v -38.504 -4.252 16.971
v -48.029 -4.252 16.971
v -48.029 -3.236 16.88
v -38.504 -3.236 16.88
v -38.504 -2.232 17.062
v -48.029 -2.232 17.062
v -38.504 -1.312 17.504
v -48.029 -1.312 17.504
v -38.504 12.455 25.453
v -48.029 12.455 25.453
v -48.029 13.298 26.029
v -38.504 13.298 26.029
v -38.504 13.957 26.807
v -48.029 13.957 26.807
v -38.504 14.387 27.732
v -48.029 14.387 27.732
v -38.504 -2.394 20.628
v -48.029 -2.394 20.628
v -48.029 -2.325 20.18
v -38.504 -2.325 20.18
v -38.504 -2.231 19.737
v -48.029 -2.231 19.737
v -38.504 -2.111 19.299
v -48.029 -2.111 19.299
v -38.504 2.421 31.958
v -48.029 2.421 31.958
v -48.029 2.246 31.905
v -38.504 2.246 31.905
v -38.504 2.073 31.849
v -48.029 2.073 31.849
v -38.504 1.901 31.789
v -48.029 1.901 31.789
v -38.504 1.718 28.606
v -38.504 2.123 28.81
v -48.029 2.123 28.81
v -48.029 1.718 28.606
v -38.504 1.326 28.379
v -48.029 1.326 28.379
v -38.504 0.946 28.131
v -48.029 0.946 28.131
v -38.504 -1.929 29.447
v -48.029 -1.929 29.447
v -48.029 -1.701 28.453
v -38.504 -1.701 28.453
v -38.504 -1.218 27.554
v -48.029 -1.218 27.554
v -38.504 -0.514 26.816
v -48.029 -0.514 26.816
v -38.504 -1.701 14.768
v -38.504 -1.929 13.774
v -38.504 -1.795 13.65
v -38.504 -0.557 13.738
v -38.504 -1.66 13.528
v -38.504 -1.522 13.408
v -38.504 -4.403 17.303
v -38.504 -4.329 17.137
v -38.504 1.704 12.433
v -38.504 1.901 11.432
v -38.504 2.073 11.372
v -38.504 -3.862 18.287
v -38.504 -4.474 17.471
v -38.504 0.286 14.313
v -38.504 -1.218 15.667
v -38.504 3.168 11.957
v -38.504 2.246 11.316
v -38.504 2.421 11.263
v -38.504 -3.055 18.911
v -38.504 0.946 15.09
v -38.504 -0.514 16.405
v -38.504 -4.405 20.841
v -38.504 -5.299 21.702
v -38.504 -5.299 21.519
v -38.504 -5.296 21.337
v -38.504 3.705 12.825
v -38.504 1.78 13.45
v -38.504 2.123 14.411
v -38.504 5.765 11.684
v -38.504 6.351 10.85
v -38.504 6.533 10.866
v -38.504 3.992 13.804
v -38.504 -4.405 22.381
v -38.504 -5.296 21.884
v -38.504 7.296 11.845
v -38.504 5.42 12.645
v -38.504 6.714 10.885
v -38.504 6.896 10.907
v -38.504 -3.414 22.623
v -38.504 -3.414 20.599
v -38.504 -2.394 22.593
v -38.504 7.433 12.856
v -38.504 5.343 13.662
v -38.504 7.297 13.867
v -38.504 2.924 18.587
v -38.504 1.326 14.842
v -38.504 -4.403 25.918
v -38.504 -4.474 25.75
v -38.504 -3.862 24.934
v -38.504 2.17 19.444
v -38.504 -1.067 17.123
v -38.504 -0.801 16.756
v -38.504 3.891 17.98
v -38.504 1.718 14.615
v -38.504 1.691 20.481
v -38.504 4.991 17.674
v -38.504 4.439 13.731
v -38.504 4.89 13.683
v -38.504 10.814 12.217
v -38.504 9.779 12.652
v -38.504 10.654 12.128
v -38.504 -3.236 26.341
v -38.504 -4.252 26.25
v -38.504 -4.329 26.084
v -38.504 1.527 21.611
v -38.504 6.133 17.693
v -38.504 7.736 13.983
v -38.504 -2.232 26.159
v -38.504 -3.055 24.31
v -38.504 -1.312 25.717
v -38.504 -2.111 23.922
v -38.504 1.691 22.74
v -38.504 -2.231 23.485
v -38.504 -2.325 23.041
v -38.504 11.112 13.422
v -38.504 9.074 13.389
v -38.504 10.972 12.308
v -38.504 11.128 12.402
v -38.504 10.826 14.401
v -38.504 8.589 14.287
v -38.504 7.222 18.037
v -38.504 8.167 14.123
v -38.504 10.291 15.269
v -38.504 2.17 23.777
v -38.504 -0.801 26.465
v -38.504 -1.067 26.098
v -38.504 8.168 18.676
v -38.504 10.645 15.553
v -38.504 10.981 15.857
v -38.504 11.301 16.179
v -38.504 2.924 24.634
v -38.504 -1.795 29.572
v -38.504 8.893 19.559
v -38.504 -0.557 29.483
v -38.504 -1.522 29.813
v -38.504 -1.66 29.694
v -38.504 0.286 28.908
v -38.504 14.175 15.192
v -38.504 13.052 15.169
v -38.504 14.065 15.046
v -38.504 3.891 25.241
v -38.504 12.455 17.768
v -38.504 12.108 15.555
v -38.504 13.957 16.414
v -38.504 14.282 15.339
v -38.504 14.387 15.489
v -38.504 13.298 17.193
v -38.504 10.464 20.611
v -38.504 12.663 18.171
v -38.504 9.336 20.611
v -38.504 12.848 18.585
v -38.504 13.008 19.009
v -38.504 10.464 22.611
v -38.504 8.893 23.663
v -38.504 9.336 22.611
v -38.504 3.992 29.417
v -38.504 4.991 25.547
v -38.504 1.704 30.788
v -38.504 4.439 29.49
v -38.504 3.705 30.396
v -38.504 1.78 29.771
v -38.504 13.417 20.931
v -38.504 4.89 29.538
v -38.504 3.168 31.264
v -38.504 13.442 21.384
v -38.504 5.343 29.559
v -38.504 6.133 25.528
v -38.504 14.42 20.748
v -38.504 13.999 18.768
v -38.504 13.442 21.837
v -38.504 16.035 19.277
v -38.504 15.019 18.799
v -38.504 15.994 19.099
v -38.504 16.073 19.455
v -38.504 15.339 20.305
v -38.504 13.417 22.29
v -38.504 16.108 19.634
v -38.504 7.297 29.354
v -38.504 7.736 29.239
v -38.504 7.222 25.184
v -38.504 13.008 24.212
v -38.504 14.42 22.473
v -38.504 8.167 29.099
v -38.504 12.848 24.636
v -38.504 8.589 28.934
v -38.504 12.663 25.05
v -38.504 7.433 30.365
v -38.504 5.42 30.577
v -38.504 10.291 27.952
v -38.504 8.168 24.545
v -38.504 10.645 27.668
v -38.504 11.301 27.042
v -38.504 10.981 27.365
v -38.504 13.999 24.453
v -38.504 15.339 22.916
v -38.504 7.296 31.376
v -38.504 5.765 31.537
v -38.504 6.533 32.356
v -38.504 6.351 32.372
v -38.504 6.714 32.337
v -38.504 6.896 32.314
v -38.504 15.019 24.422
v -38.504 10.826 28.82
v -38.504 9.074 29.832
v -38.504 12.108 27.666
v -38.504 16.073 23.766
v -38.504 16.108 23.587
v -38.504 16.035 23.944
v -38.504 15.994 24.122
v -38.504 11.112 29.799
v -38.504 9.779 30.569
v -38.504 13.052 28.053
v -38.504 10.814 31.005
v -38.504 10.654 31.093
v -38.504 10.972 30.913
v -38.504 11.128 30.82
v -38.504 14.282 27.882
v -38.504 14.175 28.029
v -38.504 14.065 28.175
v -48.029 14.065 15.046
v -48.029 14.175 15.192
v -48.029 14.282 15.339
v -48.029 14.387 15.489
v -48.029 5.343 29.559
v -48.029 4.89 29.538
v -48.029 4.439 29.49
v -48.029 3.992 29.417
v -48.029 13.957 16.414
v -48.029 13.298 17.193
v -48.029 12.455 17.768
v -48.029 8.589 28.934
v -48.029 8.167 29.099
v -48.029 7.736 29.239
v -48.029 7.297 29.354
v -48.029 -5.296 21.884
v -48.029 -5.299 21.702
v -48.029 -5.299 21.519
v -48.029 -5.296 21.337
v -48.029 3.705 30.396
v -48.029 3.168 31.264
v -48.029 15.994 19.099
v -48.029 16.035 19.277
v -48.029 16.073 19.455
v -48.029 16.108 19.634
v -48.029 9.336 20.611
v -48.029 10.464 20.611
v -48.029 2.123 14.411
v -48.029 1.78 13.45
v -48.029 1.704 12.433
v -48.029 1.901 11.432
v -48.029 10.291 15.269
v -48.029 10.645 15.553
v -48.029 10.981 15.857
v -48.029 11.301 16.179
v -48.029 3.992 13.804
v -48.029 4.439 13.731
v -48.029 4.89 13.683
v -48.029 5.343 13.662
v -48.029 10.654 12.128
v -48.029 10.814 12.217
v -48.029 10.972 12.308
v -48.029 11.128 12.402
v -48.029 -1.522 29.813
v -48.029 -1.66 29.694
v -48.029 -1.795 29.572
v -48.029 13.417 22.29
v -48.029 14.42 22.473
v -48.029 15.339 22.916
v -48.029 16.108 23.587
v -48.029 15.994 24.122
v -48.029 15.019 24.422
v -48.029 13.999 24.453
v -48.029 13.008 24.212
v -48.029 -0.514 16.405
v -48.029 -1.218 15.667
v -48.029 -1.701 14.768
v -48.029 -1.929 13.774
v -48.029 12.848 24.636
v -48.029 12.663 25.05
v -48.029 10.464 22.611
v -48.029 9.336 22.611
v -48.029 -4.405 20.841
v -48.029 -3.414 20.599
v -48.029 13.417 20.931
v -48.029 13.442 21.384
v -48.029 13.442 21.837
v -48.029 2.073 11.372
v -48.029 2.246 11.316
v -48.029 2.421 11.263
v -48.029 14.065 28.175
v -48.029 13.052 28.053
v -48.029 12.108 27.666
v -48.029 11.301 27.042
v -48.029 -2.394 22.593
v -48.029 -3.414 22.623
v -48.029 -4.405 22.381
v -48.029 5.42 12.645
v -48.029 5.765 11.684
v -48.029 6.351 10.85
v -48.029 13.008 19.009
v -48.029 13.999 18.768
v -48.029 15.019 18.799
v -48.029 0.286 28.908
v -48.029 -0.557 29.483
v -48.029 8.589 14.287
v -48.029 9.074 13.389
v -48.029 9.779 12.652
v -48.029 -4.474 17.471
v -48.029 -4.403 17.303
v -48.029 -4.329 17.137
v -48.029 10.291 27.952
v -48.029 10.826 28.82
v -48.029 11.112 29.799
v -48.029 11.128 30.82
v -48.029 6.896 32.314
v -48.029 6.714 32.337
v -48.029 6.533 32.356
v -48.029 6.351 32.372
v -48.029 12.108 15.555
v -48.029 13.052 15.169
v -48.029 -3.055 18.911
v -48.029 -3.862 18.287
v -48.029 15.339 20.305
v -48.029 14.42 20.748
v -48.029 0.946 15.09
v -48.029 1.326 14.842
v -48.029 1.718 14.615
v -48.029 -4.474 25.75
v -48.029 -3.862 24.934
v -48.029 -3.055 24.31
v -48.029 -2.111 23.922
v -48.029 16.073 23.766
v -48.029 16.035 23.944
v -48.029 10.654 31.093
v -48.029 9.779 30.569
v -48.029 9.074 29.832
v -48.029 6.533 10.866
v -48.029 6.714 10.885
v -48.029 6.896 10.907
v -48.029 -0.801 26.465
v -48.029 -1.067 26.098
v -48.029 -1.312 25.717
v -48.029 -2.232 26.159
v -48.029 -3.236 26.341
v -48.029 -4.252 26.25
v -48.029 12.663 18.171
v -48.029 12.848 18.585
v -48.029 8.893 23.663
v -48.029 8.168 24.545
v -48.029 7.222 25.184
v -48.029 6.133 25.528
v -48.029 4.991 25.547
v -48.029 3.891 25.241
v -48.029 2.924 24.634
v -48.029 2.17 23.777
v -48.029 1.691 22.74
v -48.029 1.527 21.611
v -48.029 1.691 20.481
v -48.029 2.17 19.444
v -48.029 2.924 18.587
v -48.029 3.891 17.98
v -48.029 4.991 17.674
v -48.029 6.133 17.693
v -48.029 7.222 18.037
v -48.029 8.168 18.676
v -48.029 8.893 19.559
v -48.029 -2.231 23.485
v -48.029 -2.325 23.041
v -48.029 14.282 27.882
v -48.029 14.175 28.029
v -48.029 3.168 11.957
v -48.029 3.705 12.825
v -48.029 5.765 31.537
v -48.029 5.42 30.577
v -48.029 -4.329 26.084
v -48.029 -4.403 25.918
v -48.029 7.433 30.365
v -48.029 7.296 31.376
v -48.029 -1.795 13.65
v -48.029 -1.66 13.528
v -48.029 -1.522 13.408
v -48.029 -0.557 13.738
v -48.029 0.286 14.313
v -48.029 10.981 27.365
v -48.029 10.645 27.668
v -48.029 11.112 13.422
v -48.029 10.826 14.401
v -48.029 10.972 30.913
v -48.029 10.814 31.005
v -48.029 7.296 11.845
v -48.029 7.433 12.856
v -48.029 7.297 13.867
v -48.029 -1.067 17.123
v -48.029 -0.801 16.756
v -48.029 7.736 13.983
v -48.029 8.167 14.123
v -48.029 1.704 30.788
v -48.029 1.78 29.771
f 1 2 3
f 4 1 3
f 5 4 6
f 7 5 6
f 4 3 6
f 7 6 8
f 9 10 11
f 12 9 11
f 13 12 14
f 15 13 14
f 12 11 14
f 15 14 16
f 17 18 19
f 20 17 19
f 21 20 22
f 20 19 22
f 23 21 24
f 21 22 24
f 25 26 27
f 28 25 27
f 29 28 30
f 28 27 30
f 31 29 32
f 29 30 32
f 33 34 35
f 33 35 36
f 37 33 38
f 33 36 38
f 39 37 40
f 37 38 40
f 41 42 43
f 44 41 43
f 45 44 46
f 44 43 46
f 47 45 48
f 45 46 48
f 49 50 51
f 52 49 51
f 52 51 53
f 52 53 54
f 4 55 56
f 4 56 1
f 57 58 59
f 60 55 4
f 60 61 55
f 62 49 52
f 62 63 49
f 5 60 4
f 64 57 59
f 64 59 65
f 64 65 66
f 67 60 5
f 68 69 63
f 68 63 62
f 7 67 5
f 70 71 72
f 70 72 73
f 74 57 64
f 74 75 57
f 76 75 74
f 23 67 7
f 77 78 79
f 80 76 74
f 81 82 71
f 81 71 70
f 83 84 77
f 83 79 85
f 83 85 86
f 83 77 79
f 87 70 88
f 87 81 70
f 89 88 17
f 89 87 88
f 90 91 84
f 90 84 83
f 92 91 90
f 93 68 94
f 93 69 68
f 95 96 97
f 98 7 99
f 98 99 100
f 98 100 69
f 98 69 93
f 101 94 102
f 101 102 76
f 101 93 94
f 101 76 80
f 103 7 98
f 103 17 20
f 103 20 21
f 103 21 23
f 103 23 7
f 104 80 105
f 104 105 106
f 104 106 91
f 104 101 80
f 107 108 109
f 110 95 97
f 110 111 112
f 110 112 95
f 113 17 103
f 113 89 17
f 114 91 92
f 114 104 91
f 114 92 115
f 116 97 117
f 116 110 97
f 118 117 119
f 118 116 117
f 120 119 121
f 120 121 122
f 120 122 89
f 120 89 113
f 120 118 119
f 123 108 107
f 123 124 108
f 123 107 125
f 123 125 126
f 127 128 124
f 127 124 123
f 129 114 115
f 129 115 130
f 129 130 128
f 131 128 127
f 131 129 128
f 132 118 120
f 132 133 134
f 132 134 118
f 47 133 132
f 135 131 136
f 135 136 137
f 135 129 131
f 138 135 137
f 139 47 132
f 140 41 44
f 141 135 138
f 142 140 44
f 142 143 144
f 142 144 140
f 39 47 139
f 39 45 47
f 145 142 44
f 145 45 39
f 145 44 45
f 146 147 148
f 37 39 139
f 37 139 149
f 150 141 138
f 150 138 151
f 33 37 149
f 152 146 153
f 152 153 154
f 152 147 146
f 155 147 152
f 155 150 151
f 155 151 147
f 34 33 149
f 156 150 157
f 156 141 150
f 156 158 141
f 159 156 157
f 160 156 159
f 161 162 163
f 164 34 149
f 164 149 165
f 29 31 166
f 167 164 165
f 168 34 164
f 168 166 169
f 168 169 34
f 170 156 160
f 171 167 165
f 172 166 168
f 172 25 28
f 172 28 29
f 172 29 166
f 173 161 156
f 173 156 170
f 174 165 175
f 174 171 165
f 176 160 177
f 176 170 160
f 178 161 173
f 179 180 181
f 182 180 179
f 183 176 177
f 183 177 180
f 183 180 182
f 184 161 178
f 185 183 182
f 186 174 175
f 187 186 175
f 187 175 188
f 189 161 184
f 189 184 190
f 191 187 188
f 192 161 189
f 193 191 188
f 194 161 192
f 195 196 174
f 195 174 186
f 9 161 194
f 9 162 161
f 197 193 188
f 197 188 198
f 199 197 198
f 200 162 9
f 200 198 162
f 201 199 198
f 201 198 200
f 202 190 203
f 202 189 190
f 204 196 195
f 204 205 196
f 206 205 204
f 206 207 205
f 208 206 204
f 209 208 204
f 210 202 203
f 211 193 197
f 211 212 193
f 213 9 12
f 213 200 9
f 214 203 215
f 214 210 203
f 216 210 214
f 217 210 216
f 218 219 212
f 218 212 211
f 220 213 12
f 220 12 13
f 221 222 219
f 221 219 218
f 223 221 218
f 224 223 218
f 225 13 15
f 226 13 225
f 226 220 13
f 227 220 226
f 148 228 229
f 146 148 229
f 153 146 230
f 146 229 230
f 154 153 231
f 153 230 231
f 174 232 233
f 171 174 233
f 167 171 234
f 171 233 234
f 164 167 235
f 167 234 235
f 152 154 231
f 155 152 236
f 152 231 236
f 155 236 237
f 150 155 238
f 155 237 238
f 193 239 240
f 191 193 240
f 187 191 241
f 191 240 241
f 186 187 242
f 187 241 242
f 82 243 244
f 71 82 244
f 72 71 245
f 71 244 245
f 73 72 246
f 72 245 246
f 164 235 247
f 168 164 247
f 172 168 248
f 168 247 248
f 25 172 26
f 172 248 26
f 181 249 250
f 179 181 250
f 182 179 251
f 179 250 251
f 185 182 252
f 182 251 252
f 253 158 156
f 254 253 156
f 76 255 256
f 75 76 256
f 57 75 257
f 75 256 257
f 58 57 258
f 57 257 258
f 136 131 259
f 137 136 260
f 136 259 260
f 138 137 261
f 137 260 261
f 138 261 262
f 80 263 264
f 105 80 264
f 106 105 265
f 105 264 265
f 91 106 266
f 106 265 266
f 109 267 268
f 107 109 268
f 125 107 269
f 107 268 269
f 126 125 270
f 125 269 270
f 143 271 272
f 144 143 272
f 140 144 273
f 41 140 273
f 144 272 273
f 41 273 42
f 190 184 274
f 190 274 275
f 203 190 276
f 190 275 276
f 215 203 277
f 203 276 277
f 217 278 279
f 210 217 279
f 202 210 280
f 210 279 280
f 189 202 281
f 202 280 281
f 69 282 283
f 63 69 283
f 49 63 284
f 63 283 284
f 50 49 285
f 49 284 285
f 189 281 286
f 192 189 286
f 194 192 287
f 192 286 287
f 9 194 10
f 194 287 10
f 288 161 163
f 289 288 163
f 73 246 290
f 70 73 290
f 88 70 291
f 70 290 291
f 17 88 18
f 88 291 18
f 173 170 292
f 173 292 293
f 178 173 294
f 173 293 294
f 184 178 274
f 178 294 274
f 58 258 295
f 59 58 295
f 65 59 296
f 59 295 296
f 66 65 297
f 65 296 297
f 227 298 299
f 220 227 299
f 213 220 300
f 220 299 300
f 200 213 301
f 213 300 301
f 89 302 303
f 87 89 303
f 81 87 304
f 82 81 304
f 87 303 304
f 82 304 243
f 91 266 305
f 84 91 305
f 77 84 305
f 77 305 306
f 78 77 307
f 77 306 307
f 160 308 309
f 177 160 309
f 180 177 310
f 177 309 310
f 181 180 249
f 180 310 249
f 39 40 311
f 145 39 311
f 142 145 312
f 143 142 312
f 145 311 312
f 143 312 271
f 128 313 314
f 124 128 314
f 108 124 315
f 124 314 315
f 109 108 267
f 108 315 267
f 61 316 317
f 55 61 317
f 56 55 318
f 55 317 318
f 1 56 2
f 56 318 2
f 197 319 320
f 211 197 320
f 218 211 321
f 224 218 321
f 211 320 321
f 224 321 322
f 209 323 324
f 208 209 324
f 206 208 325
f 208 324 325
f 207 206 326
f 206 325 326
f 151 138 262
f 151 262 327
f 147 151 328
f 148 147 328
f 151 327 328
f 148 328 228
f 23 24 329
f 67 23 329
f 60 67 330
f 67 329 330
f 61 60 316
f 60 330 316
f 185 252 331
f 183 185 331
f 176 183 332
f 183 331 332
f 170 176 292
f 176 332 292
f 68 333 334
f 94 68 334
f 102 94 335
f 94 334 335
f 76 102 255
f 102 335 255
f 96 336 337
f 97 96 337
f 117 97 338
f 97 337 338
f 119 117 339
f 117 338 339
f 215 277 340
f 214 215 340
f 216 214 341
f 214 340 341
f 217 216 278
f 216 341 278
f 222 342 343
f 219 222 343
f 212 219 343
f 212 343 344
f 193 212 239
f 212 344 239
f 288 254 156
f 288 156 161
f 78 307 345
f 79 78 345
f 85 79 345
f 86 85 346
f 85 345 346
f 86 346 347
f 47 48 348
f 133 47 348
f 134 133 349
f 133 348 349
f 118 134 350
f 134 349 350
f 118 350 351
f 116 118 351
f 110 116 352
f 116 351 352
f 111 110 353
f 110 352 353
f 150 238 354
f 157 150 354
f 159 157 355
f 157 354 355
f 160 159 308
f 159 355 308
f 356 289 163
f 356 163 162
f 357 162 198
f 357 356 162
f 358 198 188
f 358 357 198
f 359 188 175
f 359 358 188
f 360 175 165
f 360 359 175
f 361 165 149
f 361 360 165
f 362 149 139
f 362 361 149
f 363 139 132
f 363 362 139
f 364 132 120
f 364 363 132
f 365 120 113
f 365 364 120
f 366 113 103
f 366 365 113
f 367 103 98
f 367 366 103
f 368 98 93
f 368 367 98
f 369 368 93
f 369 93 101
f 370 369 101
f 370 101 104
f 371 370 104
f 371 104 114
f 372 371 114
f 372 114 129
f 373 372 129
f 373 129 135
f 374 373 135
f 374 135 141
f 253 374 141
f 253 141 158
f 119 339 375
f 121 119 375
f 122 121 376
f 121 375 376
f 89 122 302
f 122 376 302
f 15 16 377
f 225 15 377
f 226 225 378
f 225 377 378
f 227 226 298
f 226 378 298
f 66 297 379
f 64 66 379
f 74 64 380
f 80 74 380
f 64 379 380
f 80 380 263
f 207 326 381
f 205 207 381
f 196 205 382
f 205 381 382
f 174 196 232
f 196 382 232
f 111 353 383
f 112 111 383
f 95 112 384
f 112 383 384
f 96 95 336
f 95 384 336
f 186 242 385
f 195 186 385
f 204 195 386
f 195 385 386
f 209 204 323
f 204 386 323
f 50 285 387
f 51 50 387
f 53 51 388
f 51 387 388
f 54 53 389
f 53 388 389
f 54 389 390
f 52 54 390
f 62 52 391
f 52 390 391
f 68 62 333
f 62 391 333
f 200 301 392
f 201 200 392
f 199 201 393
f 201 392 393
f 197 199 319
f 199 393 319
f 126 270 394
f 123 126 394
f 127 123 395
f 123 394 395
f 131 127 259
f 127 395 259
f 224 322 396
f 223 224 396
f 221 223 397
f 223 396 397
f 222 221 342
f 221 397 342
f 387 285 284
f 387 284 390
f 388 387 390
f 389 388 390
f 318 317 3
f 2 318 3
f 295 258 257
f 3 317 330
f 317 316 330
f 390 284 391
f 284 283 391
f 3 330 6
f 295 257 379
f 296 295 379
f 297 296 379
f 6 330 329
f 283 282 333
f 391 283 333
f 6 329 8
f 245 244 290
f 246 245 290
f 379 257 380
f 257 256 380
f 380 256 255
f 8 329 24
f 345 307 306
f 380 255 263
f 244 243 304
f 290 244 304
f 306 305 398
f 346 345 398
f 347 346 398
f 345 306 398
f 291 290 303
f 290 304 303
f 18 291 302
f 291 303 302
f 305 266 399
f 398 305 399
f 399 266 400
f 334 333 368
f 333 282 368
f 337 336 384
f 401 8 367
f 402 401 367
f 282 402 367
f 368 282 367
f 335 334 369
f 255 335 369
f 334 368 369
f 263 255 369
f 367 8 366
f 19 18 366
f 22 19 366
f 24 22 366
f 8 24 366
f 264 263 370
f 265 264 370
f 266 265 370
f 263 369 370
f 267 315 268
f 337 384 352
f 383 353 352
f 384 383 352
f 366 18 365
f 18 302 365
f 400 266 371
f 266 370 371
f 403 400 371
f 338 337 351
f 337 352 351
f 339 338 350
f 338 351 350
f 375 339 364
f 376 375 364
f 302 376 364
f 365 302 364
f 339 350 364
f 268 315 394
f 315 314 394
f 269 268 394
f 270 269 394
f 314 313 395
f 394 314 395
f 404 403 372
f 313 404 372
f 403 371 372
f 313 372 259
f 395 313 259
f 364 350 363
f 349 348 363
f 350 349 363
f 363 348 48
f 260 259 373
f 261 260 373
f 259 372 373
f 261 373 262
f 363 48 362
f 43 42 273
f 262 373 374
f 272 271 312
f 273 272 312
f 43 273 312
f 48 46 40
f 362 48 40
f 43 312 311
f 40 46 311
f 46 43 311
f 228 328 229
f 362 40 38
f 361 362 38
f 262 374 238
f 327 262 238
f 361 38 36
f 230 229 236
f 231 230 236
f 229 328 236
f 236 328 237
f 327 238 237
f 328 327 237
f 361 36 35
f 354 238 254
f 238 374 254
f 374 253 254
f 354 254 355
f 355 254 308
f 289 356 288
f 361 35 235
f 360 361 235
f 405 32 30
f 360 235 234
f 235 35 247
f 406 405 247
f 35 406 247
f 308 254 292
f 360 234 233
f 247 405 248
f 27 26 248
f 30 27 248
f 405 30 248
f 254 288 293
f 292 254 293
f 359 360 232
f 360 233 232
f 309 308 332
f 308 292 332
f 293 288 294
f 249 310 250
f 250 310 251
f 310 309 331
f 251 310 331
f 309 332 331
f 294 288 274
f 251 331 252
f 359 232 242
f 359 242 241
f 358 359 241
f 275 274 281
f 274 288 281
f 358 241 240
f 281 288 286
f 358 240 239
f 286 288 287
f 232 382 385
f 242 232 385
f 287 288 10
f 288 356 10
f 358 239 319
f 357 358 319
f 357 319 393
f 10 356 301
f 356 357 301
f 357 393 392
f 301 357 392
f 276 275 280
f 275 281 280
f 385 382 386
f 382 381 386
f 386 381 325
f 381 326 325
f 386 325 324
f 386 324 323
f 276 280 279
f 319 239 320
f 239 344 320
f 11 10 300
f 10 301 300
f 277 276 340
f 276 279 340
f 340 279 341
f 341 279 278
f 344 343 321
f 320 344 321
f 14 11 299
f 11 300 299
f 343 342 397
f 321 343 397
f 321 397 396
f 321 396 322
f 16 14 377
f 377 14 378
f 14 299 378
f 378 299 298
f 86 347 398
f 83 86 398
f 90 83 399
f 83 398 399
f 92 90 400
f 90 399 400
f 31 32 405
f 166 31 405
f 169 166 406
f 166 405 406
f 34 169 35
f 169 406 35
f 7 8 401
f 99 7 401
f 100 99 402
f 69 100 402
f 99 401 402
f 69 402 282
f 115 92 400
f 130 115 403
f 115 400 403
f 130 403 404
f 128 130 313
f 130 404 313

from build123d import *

# Parameters (mm, degrees)
SPUR_START             = -48.028721504
SPUR_GEAR_AI_OUTLINE_R = 3.96875
SPUR_GEAR_AI_DEPTH     = 9.525
CUT_EXTRUDE1_DEPTH     = 38.391363975


# Read off the part's stored shape, not the designer's step: spur gear_ai
with BuildPart() as part:
    # spur gear_ai outline → spur gear_ai (new body)
    with BuildSketch(Plane.YZ.offset(SPUR_START)):
        with BuildLine():
            ThreePointArc((14.065180693, 15.046177845), (14.228771479, 15.265443857), (14.386753515, 15.488784863))
            ThreePointArc((14.386753515, 15.488784863), (13.653794557, 16.82563811), (12.455383467, 17.768090388))
            ThreePointArc((12.455383467, 17.768090388), (12.758302122, 18.376947995), (13.008079359, 19.009465686))
            ThreePointArc((13.008079359, 19.009465686), (14.510351432, 18.74949635), (15.994272276, 19.099331116))
            ThreePointArc((15.994272276, 19.099331116), (16.054536374, 19.366178952), (16.108019174, 19.634468198))
            ThreePointArc((16.108019174, 19.634468198), (14.894680646, 20.557623143), (13.416547762, 20.931158437))
            ThreePointArc((13.416547762, 20.931158437), (13.445633024, 21.610585655), (13.416547762, 22.290012873))
            ThreePointArc((13.416547762, 22.290012873), (14.894680646, 22.663548167), (16.108019174, 23.586703112))
            ThreePointArc((16.108019174, 23.586703112), (16.054536374, 23.854992358), (15.994272276, 24.121840194))
            ThreePointArc((15.994272276, 24.121840194), (14.510351432, 24.47167496), (13.008079359, 24.211705624))
            ThreePointArc((13.008079359, 24.211705624), (12.758302122, 24.844223315), (12.455383467, 25.453080922))
            ThreePointArc((12.455383467, 25.453080922), (13.653794557, 26.3955332), (14.386753515, 27.732386447))
            ThreePointArc((14.386753515, 27.732386447), (14.228771479, 27.955727454), (14.065180693, 28.174993465))
            ThreePointArc((14.065180693, 28.174993465), (12.567260927, 27.891018444), (11.300606153, 27.042495538))
            ThreePointArc((11.300606153, 27.042495538), (10.815155171, 27.518735647), (10.290780511, 27.951746631))
            ThreePointArc((10.290780511, 27.951746631), (11.002253642, 29.300157333), (11.128097767, 30.81955481))
            ThreePointArc((11.128097767, 30.81955481), (10.892933024, 30.959329889), (10.654301883, 31.093100991))
            ThreePointArc((10.654301883, 31.093100991), (9.401387132, 30.224418043), (8.589365776, 28.934058886))
            ThreePointArc((8.589365776, 28.934058886), (7.952179933, 29.171675171), (7.29701841, 29.353968))
            ThreePointArc((7.29701841, 29.353968), (7.398533415, 30.875184664), (6.895503115, 32.314408745))
            ThreePointArc((6.895503115, 32.314408745), (6.623817785, 32.346449516), (6.351407781, 32.371595469))
            ThreePointArc((6.351407781, 32.371595469), (5.560138388, 31.068407768), (5.343156318, 29.559327181))
            ThreePointArc((5.343156318, 29.559327181), (4.664410836, 29.517233628), (3.991745829, 29.417288215))
            ThreePointArc((3.991745829, 29.417288215), (3.465749841, 30.848278661), (2.420823624, 31.958474427))
            ThreePointArc((2.420823624, 31.958474427), (2.15959457, 31.877240748), (1.900507868, 31.789413589))
            ThreePointArc((1.900507868, 31.789413589), (1.707701498, 30.277054127), (2.123276886, 28.810185853))
            ThreePointArc((2.123276886, 28.810185853), (1.520333024, 28.49566082), (0.946474424, 28.130758636))
            ThreePointArc((0.946474424, 28.130758636), (-0.116083071, 29.224091616), (-1.522227969, 29.813296133))
            ThreePointArc((-1.522227969, 29.813296133), (-1.727831871, 29.632834046), (-1.928796828, 29.447219888))
            ThreePointArc((-1.928796828, 29.447219888), (-1.4898022, 27.987189356), (-0.513526115, 26.816168245))
            ThreePointArc((-0.513526115, 26.816168245), (-0.936413884, 26.283595967), (-1.312240712, 25.716831914))
            ThreePointArc((-1.312240712, 25.716831914), (-2.727633872, 26.283460223), (-4.251862224, 26.249794677))
            ThreePointArc((-4.251862224, 26.249794677), (-4.366290191, 26.001307717), (-4.474384734, 25.750000935))
            ThreePointArc((-4.474384734, 25.750000935), (-3.479495269, 24.594751875), (-2.11132549, 23.922058116))
            ThreePointArc((-2.11132549, 23.922058116), (-2.281036031, 23.263525179), (-2.393847214, 22.59289791))
            ThreePointArc((-2.393847214, 22.59289791), (-3.917341702, 22.534846366), (-5.296100578, 21.884131836))
            ThreePointArc((-5.296100578, 21.884131836), (-5.299566976, 21.610585655), (-5.296100578, 21.337039474))
            ThreePointArc((-5.296100578, 21.337039474), (-3.917341702, 20.686324945), (-2.393847214, 20.6282734))
            ThreePointArc((-2.393847214, 20.6282734), (-2.281036031, 19.957646131), (-2.11132549, 19.299113194))
            ThreePointArc((-2.11132549, 19.299113194), (-3.479495269, 18.626419435), (-4.474384734, 17.471170375))
            ThreePointArc((-4.474384734, 17.471170375), (-4.366290191, 17.219863593), (-4.251862224, 16.971376633))
            ThreePointArc((-4.251862224, 16.971376633), (-2.727633872, 16.937711087), (-1.312240712, 17.504339396))
            ThreePointArc((-1.312240712, 17.504339396), (-0.936413884, 16.937575343), (-0.513526115, 16.405003065))
            ThreePointArc((-0.513526115, 16.405003065), (-1.4898022, 15.233981954), (-1.928796828, 13.773951422))
            ThreePointArc((-1.928796828, 13.773951422), (-1.727831871, 13.588337264), (-1.522227969, 13.407875177))
            ThreePointArc((-1.522227969, 13.407875177), (-0.116083071, 13.997079694), (0.946474424, 15.090412674))
            ThreePointArc((0.946474424, 15.090412674), (1.520333024, 14.72551049), (2.123276886, 14.410985457))
            ThreePointArc((2.123276886, 14.410985457), (1.707701498, 12.944117183), (1.900507868, 11.431757721))
            ThreePointArc((1.900507868, 11.431757721), (2.15959457, 11.343930562), (2.420823624, 11.262696883))
            ThreePointArc((2.420823624, 11.262696883), (3.465749841, 12.372892649), (3.991745829, 13.803883095))
            ThreePointArc((3.991745829, 13.803883095), (4.664410836, 13.703937682), (5.343156318, 13.661844129))
            ThreePointArc((5.343156318, 13.661844129), (5.560138388, 12.152763542), (6.351407781, 10.849575841))
            ThreePointArc((6.351407781, 10.849575841), (6.623817785, 10.874721795), (6.895503115, 10.906762565))
            ThreePointArc((6.895503115, 10.906762565), (7.398533415, 12.345986646), (7.29701841, 13.86720331))
            ThreePointArc((7.29701841, 13.86720331), (7.952179933, 14.049496139), (8.589365776, 14.287112424))
            ThreePointArc((8.589365776, 14.287112424), (9.401387132, 12.996753267), (10.654301883, 12.128070319))
            ThreePointArc((10.654301883, 12.128070319), (10.892933024, 12.261841421), (11.128097767, 12.4016165))
            ThreePointArc((11.128097767, 12.4016165), (11.002253642, 13.921013977), (10.290780511, 15.269424679))
            ThreePointArc((10.290780511, 15.269424679), (10.815155171, 15.702435663), (11.300606153, 16.178675772))
            ThreePointArc((11.300606153, 16.178675772), (12.567260927, 15.330152866), (14.065180693, 15.046177845))
        make_face()
        with Locations((5.495433024, 21.610585655)):
            Circle(SPUR_GEAR_AI_OUTLINE_R, mode=Mode.SUBTRACT)
    extrude(amount=SPUR_GEAR_AI_DEPTH)

    # Sketch1 → Cut-Extrude1 (cut, through all)
    with BuildSketch(Plane(origin=(-38.503721504, 0, 0), x_dir=(0, 0, -1), z_dir=(1, 0, 0))):
        with BuildLine():
            Line((-20.610585655, 9.336133034), (-20.610585655, 10.464183024))
            Line((-20.610585655, 10.464183024), (-22.610585655, 10.464183024))
            Line((-22.610585655, 10.464183024), (-22.610585655, 9.336133034))
            ThreePointArc((-22.610585655, 9.336133034), (-21.610585655, 9.464183024), (-20.610585655, 9.336133034))
        make_face()
    extrude(amount=-CUT_EXTRUDE1_DEPTH, mode=Mode.SUBTRACT)


solid = part.part
